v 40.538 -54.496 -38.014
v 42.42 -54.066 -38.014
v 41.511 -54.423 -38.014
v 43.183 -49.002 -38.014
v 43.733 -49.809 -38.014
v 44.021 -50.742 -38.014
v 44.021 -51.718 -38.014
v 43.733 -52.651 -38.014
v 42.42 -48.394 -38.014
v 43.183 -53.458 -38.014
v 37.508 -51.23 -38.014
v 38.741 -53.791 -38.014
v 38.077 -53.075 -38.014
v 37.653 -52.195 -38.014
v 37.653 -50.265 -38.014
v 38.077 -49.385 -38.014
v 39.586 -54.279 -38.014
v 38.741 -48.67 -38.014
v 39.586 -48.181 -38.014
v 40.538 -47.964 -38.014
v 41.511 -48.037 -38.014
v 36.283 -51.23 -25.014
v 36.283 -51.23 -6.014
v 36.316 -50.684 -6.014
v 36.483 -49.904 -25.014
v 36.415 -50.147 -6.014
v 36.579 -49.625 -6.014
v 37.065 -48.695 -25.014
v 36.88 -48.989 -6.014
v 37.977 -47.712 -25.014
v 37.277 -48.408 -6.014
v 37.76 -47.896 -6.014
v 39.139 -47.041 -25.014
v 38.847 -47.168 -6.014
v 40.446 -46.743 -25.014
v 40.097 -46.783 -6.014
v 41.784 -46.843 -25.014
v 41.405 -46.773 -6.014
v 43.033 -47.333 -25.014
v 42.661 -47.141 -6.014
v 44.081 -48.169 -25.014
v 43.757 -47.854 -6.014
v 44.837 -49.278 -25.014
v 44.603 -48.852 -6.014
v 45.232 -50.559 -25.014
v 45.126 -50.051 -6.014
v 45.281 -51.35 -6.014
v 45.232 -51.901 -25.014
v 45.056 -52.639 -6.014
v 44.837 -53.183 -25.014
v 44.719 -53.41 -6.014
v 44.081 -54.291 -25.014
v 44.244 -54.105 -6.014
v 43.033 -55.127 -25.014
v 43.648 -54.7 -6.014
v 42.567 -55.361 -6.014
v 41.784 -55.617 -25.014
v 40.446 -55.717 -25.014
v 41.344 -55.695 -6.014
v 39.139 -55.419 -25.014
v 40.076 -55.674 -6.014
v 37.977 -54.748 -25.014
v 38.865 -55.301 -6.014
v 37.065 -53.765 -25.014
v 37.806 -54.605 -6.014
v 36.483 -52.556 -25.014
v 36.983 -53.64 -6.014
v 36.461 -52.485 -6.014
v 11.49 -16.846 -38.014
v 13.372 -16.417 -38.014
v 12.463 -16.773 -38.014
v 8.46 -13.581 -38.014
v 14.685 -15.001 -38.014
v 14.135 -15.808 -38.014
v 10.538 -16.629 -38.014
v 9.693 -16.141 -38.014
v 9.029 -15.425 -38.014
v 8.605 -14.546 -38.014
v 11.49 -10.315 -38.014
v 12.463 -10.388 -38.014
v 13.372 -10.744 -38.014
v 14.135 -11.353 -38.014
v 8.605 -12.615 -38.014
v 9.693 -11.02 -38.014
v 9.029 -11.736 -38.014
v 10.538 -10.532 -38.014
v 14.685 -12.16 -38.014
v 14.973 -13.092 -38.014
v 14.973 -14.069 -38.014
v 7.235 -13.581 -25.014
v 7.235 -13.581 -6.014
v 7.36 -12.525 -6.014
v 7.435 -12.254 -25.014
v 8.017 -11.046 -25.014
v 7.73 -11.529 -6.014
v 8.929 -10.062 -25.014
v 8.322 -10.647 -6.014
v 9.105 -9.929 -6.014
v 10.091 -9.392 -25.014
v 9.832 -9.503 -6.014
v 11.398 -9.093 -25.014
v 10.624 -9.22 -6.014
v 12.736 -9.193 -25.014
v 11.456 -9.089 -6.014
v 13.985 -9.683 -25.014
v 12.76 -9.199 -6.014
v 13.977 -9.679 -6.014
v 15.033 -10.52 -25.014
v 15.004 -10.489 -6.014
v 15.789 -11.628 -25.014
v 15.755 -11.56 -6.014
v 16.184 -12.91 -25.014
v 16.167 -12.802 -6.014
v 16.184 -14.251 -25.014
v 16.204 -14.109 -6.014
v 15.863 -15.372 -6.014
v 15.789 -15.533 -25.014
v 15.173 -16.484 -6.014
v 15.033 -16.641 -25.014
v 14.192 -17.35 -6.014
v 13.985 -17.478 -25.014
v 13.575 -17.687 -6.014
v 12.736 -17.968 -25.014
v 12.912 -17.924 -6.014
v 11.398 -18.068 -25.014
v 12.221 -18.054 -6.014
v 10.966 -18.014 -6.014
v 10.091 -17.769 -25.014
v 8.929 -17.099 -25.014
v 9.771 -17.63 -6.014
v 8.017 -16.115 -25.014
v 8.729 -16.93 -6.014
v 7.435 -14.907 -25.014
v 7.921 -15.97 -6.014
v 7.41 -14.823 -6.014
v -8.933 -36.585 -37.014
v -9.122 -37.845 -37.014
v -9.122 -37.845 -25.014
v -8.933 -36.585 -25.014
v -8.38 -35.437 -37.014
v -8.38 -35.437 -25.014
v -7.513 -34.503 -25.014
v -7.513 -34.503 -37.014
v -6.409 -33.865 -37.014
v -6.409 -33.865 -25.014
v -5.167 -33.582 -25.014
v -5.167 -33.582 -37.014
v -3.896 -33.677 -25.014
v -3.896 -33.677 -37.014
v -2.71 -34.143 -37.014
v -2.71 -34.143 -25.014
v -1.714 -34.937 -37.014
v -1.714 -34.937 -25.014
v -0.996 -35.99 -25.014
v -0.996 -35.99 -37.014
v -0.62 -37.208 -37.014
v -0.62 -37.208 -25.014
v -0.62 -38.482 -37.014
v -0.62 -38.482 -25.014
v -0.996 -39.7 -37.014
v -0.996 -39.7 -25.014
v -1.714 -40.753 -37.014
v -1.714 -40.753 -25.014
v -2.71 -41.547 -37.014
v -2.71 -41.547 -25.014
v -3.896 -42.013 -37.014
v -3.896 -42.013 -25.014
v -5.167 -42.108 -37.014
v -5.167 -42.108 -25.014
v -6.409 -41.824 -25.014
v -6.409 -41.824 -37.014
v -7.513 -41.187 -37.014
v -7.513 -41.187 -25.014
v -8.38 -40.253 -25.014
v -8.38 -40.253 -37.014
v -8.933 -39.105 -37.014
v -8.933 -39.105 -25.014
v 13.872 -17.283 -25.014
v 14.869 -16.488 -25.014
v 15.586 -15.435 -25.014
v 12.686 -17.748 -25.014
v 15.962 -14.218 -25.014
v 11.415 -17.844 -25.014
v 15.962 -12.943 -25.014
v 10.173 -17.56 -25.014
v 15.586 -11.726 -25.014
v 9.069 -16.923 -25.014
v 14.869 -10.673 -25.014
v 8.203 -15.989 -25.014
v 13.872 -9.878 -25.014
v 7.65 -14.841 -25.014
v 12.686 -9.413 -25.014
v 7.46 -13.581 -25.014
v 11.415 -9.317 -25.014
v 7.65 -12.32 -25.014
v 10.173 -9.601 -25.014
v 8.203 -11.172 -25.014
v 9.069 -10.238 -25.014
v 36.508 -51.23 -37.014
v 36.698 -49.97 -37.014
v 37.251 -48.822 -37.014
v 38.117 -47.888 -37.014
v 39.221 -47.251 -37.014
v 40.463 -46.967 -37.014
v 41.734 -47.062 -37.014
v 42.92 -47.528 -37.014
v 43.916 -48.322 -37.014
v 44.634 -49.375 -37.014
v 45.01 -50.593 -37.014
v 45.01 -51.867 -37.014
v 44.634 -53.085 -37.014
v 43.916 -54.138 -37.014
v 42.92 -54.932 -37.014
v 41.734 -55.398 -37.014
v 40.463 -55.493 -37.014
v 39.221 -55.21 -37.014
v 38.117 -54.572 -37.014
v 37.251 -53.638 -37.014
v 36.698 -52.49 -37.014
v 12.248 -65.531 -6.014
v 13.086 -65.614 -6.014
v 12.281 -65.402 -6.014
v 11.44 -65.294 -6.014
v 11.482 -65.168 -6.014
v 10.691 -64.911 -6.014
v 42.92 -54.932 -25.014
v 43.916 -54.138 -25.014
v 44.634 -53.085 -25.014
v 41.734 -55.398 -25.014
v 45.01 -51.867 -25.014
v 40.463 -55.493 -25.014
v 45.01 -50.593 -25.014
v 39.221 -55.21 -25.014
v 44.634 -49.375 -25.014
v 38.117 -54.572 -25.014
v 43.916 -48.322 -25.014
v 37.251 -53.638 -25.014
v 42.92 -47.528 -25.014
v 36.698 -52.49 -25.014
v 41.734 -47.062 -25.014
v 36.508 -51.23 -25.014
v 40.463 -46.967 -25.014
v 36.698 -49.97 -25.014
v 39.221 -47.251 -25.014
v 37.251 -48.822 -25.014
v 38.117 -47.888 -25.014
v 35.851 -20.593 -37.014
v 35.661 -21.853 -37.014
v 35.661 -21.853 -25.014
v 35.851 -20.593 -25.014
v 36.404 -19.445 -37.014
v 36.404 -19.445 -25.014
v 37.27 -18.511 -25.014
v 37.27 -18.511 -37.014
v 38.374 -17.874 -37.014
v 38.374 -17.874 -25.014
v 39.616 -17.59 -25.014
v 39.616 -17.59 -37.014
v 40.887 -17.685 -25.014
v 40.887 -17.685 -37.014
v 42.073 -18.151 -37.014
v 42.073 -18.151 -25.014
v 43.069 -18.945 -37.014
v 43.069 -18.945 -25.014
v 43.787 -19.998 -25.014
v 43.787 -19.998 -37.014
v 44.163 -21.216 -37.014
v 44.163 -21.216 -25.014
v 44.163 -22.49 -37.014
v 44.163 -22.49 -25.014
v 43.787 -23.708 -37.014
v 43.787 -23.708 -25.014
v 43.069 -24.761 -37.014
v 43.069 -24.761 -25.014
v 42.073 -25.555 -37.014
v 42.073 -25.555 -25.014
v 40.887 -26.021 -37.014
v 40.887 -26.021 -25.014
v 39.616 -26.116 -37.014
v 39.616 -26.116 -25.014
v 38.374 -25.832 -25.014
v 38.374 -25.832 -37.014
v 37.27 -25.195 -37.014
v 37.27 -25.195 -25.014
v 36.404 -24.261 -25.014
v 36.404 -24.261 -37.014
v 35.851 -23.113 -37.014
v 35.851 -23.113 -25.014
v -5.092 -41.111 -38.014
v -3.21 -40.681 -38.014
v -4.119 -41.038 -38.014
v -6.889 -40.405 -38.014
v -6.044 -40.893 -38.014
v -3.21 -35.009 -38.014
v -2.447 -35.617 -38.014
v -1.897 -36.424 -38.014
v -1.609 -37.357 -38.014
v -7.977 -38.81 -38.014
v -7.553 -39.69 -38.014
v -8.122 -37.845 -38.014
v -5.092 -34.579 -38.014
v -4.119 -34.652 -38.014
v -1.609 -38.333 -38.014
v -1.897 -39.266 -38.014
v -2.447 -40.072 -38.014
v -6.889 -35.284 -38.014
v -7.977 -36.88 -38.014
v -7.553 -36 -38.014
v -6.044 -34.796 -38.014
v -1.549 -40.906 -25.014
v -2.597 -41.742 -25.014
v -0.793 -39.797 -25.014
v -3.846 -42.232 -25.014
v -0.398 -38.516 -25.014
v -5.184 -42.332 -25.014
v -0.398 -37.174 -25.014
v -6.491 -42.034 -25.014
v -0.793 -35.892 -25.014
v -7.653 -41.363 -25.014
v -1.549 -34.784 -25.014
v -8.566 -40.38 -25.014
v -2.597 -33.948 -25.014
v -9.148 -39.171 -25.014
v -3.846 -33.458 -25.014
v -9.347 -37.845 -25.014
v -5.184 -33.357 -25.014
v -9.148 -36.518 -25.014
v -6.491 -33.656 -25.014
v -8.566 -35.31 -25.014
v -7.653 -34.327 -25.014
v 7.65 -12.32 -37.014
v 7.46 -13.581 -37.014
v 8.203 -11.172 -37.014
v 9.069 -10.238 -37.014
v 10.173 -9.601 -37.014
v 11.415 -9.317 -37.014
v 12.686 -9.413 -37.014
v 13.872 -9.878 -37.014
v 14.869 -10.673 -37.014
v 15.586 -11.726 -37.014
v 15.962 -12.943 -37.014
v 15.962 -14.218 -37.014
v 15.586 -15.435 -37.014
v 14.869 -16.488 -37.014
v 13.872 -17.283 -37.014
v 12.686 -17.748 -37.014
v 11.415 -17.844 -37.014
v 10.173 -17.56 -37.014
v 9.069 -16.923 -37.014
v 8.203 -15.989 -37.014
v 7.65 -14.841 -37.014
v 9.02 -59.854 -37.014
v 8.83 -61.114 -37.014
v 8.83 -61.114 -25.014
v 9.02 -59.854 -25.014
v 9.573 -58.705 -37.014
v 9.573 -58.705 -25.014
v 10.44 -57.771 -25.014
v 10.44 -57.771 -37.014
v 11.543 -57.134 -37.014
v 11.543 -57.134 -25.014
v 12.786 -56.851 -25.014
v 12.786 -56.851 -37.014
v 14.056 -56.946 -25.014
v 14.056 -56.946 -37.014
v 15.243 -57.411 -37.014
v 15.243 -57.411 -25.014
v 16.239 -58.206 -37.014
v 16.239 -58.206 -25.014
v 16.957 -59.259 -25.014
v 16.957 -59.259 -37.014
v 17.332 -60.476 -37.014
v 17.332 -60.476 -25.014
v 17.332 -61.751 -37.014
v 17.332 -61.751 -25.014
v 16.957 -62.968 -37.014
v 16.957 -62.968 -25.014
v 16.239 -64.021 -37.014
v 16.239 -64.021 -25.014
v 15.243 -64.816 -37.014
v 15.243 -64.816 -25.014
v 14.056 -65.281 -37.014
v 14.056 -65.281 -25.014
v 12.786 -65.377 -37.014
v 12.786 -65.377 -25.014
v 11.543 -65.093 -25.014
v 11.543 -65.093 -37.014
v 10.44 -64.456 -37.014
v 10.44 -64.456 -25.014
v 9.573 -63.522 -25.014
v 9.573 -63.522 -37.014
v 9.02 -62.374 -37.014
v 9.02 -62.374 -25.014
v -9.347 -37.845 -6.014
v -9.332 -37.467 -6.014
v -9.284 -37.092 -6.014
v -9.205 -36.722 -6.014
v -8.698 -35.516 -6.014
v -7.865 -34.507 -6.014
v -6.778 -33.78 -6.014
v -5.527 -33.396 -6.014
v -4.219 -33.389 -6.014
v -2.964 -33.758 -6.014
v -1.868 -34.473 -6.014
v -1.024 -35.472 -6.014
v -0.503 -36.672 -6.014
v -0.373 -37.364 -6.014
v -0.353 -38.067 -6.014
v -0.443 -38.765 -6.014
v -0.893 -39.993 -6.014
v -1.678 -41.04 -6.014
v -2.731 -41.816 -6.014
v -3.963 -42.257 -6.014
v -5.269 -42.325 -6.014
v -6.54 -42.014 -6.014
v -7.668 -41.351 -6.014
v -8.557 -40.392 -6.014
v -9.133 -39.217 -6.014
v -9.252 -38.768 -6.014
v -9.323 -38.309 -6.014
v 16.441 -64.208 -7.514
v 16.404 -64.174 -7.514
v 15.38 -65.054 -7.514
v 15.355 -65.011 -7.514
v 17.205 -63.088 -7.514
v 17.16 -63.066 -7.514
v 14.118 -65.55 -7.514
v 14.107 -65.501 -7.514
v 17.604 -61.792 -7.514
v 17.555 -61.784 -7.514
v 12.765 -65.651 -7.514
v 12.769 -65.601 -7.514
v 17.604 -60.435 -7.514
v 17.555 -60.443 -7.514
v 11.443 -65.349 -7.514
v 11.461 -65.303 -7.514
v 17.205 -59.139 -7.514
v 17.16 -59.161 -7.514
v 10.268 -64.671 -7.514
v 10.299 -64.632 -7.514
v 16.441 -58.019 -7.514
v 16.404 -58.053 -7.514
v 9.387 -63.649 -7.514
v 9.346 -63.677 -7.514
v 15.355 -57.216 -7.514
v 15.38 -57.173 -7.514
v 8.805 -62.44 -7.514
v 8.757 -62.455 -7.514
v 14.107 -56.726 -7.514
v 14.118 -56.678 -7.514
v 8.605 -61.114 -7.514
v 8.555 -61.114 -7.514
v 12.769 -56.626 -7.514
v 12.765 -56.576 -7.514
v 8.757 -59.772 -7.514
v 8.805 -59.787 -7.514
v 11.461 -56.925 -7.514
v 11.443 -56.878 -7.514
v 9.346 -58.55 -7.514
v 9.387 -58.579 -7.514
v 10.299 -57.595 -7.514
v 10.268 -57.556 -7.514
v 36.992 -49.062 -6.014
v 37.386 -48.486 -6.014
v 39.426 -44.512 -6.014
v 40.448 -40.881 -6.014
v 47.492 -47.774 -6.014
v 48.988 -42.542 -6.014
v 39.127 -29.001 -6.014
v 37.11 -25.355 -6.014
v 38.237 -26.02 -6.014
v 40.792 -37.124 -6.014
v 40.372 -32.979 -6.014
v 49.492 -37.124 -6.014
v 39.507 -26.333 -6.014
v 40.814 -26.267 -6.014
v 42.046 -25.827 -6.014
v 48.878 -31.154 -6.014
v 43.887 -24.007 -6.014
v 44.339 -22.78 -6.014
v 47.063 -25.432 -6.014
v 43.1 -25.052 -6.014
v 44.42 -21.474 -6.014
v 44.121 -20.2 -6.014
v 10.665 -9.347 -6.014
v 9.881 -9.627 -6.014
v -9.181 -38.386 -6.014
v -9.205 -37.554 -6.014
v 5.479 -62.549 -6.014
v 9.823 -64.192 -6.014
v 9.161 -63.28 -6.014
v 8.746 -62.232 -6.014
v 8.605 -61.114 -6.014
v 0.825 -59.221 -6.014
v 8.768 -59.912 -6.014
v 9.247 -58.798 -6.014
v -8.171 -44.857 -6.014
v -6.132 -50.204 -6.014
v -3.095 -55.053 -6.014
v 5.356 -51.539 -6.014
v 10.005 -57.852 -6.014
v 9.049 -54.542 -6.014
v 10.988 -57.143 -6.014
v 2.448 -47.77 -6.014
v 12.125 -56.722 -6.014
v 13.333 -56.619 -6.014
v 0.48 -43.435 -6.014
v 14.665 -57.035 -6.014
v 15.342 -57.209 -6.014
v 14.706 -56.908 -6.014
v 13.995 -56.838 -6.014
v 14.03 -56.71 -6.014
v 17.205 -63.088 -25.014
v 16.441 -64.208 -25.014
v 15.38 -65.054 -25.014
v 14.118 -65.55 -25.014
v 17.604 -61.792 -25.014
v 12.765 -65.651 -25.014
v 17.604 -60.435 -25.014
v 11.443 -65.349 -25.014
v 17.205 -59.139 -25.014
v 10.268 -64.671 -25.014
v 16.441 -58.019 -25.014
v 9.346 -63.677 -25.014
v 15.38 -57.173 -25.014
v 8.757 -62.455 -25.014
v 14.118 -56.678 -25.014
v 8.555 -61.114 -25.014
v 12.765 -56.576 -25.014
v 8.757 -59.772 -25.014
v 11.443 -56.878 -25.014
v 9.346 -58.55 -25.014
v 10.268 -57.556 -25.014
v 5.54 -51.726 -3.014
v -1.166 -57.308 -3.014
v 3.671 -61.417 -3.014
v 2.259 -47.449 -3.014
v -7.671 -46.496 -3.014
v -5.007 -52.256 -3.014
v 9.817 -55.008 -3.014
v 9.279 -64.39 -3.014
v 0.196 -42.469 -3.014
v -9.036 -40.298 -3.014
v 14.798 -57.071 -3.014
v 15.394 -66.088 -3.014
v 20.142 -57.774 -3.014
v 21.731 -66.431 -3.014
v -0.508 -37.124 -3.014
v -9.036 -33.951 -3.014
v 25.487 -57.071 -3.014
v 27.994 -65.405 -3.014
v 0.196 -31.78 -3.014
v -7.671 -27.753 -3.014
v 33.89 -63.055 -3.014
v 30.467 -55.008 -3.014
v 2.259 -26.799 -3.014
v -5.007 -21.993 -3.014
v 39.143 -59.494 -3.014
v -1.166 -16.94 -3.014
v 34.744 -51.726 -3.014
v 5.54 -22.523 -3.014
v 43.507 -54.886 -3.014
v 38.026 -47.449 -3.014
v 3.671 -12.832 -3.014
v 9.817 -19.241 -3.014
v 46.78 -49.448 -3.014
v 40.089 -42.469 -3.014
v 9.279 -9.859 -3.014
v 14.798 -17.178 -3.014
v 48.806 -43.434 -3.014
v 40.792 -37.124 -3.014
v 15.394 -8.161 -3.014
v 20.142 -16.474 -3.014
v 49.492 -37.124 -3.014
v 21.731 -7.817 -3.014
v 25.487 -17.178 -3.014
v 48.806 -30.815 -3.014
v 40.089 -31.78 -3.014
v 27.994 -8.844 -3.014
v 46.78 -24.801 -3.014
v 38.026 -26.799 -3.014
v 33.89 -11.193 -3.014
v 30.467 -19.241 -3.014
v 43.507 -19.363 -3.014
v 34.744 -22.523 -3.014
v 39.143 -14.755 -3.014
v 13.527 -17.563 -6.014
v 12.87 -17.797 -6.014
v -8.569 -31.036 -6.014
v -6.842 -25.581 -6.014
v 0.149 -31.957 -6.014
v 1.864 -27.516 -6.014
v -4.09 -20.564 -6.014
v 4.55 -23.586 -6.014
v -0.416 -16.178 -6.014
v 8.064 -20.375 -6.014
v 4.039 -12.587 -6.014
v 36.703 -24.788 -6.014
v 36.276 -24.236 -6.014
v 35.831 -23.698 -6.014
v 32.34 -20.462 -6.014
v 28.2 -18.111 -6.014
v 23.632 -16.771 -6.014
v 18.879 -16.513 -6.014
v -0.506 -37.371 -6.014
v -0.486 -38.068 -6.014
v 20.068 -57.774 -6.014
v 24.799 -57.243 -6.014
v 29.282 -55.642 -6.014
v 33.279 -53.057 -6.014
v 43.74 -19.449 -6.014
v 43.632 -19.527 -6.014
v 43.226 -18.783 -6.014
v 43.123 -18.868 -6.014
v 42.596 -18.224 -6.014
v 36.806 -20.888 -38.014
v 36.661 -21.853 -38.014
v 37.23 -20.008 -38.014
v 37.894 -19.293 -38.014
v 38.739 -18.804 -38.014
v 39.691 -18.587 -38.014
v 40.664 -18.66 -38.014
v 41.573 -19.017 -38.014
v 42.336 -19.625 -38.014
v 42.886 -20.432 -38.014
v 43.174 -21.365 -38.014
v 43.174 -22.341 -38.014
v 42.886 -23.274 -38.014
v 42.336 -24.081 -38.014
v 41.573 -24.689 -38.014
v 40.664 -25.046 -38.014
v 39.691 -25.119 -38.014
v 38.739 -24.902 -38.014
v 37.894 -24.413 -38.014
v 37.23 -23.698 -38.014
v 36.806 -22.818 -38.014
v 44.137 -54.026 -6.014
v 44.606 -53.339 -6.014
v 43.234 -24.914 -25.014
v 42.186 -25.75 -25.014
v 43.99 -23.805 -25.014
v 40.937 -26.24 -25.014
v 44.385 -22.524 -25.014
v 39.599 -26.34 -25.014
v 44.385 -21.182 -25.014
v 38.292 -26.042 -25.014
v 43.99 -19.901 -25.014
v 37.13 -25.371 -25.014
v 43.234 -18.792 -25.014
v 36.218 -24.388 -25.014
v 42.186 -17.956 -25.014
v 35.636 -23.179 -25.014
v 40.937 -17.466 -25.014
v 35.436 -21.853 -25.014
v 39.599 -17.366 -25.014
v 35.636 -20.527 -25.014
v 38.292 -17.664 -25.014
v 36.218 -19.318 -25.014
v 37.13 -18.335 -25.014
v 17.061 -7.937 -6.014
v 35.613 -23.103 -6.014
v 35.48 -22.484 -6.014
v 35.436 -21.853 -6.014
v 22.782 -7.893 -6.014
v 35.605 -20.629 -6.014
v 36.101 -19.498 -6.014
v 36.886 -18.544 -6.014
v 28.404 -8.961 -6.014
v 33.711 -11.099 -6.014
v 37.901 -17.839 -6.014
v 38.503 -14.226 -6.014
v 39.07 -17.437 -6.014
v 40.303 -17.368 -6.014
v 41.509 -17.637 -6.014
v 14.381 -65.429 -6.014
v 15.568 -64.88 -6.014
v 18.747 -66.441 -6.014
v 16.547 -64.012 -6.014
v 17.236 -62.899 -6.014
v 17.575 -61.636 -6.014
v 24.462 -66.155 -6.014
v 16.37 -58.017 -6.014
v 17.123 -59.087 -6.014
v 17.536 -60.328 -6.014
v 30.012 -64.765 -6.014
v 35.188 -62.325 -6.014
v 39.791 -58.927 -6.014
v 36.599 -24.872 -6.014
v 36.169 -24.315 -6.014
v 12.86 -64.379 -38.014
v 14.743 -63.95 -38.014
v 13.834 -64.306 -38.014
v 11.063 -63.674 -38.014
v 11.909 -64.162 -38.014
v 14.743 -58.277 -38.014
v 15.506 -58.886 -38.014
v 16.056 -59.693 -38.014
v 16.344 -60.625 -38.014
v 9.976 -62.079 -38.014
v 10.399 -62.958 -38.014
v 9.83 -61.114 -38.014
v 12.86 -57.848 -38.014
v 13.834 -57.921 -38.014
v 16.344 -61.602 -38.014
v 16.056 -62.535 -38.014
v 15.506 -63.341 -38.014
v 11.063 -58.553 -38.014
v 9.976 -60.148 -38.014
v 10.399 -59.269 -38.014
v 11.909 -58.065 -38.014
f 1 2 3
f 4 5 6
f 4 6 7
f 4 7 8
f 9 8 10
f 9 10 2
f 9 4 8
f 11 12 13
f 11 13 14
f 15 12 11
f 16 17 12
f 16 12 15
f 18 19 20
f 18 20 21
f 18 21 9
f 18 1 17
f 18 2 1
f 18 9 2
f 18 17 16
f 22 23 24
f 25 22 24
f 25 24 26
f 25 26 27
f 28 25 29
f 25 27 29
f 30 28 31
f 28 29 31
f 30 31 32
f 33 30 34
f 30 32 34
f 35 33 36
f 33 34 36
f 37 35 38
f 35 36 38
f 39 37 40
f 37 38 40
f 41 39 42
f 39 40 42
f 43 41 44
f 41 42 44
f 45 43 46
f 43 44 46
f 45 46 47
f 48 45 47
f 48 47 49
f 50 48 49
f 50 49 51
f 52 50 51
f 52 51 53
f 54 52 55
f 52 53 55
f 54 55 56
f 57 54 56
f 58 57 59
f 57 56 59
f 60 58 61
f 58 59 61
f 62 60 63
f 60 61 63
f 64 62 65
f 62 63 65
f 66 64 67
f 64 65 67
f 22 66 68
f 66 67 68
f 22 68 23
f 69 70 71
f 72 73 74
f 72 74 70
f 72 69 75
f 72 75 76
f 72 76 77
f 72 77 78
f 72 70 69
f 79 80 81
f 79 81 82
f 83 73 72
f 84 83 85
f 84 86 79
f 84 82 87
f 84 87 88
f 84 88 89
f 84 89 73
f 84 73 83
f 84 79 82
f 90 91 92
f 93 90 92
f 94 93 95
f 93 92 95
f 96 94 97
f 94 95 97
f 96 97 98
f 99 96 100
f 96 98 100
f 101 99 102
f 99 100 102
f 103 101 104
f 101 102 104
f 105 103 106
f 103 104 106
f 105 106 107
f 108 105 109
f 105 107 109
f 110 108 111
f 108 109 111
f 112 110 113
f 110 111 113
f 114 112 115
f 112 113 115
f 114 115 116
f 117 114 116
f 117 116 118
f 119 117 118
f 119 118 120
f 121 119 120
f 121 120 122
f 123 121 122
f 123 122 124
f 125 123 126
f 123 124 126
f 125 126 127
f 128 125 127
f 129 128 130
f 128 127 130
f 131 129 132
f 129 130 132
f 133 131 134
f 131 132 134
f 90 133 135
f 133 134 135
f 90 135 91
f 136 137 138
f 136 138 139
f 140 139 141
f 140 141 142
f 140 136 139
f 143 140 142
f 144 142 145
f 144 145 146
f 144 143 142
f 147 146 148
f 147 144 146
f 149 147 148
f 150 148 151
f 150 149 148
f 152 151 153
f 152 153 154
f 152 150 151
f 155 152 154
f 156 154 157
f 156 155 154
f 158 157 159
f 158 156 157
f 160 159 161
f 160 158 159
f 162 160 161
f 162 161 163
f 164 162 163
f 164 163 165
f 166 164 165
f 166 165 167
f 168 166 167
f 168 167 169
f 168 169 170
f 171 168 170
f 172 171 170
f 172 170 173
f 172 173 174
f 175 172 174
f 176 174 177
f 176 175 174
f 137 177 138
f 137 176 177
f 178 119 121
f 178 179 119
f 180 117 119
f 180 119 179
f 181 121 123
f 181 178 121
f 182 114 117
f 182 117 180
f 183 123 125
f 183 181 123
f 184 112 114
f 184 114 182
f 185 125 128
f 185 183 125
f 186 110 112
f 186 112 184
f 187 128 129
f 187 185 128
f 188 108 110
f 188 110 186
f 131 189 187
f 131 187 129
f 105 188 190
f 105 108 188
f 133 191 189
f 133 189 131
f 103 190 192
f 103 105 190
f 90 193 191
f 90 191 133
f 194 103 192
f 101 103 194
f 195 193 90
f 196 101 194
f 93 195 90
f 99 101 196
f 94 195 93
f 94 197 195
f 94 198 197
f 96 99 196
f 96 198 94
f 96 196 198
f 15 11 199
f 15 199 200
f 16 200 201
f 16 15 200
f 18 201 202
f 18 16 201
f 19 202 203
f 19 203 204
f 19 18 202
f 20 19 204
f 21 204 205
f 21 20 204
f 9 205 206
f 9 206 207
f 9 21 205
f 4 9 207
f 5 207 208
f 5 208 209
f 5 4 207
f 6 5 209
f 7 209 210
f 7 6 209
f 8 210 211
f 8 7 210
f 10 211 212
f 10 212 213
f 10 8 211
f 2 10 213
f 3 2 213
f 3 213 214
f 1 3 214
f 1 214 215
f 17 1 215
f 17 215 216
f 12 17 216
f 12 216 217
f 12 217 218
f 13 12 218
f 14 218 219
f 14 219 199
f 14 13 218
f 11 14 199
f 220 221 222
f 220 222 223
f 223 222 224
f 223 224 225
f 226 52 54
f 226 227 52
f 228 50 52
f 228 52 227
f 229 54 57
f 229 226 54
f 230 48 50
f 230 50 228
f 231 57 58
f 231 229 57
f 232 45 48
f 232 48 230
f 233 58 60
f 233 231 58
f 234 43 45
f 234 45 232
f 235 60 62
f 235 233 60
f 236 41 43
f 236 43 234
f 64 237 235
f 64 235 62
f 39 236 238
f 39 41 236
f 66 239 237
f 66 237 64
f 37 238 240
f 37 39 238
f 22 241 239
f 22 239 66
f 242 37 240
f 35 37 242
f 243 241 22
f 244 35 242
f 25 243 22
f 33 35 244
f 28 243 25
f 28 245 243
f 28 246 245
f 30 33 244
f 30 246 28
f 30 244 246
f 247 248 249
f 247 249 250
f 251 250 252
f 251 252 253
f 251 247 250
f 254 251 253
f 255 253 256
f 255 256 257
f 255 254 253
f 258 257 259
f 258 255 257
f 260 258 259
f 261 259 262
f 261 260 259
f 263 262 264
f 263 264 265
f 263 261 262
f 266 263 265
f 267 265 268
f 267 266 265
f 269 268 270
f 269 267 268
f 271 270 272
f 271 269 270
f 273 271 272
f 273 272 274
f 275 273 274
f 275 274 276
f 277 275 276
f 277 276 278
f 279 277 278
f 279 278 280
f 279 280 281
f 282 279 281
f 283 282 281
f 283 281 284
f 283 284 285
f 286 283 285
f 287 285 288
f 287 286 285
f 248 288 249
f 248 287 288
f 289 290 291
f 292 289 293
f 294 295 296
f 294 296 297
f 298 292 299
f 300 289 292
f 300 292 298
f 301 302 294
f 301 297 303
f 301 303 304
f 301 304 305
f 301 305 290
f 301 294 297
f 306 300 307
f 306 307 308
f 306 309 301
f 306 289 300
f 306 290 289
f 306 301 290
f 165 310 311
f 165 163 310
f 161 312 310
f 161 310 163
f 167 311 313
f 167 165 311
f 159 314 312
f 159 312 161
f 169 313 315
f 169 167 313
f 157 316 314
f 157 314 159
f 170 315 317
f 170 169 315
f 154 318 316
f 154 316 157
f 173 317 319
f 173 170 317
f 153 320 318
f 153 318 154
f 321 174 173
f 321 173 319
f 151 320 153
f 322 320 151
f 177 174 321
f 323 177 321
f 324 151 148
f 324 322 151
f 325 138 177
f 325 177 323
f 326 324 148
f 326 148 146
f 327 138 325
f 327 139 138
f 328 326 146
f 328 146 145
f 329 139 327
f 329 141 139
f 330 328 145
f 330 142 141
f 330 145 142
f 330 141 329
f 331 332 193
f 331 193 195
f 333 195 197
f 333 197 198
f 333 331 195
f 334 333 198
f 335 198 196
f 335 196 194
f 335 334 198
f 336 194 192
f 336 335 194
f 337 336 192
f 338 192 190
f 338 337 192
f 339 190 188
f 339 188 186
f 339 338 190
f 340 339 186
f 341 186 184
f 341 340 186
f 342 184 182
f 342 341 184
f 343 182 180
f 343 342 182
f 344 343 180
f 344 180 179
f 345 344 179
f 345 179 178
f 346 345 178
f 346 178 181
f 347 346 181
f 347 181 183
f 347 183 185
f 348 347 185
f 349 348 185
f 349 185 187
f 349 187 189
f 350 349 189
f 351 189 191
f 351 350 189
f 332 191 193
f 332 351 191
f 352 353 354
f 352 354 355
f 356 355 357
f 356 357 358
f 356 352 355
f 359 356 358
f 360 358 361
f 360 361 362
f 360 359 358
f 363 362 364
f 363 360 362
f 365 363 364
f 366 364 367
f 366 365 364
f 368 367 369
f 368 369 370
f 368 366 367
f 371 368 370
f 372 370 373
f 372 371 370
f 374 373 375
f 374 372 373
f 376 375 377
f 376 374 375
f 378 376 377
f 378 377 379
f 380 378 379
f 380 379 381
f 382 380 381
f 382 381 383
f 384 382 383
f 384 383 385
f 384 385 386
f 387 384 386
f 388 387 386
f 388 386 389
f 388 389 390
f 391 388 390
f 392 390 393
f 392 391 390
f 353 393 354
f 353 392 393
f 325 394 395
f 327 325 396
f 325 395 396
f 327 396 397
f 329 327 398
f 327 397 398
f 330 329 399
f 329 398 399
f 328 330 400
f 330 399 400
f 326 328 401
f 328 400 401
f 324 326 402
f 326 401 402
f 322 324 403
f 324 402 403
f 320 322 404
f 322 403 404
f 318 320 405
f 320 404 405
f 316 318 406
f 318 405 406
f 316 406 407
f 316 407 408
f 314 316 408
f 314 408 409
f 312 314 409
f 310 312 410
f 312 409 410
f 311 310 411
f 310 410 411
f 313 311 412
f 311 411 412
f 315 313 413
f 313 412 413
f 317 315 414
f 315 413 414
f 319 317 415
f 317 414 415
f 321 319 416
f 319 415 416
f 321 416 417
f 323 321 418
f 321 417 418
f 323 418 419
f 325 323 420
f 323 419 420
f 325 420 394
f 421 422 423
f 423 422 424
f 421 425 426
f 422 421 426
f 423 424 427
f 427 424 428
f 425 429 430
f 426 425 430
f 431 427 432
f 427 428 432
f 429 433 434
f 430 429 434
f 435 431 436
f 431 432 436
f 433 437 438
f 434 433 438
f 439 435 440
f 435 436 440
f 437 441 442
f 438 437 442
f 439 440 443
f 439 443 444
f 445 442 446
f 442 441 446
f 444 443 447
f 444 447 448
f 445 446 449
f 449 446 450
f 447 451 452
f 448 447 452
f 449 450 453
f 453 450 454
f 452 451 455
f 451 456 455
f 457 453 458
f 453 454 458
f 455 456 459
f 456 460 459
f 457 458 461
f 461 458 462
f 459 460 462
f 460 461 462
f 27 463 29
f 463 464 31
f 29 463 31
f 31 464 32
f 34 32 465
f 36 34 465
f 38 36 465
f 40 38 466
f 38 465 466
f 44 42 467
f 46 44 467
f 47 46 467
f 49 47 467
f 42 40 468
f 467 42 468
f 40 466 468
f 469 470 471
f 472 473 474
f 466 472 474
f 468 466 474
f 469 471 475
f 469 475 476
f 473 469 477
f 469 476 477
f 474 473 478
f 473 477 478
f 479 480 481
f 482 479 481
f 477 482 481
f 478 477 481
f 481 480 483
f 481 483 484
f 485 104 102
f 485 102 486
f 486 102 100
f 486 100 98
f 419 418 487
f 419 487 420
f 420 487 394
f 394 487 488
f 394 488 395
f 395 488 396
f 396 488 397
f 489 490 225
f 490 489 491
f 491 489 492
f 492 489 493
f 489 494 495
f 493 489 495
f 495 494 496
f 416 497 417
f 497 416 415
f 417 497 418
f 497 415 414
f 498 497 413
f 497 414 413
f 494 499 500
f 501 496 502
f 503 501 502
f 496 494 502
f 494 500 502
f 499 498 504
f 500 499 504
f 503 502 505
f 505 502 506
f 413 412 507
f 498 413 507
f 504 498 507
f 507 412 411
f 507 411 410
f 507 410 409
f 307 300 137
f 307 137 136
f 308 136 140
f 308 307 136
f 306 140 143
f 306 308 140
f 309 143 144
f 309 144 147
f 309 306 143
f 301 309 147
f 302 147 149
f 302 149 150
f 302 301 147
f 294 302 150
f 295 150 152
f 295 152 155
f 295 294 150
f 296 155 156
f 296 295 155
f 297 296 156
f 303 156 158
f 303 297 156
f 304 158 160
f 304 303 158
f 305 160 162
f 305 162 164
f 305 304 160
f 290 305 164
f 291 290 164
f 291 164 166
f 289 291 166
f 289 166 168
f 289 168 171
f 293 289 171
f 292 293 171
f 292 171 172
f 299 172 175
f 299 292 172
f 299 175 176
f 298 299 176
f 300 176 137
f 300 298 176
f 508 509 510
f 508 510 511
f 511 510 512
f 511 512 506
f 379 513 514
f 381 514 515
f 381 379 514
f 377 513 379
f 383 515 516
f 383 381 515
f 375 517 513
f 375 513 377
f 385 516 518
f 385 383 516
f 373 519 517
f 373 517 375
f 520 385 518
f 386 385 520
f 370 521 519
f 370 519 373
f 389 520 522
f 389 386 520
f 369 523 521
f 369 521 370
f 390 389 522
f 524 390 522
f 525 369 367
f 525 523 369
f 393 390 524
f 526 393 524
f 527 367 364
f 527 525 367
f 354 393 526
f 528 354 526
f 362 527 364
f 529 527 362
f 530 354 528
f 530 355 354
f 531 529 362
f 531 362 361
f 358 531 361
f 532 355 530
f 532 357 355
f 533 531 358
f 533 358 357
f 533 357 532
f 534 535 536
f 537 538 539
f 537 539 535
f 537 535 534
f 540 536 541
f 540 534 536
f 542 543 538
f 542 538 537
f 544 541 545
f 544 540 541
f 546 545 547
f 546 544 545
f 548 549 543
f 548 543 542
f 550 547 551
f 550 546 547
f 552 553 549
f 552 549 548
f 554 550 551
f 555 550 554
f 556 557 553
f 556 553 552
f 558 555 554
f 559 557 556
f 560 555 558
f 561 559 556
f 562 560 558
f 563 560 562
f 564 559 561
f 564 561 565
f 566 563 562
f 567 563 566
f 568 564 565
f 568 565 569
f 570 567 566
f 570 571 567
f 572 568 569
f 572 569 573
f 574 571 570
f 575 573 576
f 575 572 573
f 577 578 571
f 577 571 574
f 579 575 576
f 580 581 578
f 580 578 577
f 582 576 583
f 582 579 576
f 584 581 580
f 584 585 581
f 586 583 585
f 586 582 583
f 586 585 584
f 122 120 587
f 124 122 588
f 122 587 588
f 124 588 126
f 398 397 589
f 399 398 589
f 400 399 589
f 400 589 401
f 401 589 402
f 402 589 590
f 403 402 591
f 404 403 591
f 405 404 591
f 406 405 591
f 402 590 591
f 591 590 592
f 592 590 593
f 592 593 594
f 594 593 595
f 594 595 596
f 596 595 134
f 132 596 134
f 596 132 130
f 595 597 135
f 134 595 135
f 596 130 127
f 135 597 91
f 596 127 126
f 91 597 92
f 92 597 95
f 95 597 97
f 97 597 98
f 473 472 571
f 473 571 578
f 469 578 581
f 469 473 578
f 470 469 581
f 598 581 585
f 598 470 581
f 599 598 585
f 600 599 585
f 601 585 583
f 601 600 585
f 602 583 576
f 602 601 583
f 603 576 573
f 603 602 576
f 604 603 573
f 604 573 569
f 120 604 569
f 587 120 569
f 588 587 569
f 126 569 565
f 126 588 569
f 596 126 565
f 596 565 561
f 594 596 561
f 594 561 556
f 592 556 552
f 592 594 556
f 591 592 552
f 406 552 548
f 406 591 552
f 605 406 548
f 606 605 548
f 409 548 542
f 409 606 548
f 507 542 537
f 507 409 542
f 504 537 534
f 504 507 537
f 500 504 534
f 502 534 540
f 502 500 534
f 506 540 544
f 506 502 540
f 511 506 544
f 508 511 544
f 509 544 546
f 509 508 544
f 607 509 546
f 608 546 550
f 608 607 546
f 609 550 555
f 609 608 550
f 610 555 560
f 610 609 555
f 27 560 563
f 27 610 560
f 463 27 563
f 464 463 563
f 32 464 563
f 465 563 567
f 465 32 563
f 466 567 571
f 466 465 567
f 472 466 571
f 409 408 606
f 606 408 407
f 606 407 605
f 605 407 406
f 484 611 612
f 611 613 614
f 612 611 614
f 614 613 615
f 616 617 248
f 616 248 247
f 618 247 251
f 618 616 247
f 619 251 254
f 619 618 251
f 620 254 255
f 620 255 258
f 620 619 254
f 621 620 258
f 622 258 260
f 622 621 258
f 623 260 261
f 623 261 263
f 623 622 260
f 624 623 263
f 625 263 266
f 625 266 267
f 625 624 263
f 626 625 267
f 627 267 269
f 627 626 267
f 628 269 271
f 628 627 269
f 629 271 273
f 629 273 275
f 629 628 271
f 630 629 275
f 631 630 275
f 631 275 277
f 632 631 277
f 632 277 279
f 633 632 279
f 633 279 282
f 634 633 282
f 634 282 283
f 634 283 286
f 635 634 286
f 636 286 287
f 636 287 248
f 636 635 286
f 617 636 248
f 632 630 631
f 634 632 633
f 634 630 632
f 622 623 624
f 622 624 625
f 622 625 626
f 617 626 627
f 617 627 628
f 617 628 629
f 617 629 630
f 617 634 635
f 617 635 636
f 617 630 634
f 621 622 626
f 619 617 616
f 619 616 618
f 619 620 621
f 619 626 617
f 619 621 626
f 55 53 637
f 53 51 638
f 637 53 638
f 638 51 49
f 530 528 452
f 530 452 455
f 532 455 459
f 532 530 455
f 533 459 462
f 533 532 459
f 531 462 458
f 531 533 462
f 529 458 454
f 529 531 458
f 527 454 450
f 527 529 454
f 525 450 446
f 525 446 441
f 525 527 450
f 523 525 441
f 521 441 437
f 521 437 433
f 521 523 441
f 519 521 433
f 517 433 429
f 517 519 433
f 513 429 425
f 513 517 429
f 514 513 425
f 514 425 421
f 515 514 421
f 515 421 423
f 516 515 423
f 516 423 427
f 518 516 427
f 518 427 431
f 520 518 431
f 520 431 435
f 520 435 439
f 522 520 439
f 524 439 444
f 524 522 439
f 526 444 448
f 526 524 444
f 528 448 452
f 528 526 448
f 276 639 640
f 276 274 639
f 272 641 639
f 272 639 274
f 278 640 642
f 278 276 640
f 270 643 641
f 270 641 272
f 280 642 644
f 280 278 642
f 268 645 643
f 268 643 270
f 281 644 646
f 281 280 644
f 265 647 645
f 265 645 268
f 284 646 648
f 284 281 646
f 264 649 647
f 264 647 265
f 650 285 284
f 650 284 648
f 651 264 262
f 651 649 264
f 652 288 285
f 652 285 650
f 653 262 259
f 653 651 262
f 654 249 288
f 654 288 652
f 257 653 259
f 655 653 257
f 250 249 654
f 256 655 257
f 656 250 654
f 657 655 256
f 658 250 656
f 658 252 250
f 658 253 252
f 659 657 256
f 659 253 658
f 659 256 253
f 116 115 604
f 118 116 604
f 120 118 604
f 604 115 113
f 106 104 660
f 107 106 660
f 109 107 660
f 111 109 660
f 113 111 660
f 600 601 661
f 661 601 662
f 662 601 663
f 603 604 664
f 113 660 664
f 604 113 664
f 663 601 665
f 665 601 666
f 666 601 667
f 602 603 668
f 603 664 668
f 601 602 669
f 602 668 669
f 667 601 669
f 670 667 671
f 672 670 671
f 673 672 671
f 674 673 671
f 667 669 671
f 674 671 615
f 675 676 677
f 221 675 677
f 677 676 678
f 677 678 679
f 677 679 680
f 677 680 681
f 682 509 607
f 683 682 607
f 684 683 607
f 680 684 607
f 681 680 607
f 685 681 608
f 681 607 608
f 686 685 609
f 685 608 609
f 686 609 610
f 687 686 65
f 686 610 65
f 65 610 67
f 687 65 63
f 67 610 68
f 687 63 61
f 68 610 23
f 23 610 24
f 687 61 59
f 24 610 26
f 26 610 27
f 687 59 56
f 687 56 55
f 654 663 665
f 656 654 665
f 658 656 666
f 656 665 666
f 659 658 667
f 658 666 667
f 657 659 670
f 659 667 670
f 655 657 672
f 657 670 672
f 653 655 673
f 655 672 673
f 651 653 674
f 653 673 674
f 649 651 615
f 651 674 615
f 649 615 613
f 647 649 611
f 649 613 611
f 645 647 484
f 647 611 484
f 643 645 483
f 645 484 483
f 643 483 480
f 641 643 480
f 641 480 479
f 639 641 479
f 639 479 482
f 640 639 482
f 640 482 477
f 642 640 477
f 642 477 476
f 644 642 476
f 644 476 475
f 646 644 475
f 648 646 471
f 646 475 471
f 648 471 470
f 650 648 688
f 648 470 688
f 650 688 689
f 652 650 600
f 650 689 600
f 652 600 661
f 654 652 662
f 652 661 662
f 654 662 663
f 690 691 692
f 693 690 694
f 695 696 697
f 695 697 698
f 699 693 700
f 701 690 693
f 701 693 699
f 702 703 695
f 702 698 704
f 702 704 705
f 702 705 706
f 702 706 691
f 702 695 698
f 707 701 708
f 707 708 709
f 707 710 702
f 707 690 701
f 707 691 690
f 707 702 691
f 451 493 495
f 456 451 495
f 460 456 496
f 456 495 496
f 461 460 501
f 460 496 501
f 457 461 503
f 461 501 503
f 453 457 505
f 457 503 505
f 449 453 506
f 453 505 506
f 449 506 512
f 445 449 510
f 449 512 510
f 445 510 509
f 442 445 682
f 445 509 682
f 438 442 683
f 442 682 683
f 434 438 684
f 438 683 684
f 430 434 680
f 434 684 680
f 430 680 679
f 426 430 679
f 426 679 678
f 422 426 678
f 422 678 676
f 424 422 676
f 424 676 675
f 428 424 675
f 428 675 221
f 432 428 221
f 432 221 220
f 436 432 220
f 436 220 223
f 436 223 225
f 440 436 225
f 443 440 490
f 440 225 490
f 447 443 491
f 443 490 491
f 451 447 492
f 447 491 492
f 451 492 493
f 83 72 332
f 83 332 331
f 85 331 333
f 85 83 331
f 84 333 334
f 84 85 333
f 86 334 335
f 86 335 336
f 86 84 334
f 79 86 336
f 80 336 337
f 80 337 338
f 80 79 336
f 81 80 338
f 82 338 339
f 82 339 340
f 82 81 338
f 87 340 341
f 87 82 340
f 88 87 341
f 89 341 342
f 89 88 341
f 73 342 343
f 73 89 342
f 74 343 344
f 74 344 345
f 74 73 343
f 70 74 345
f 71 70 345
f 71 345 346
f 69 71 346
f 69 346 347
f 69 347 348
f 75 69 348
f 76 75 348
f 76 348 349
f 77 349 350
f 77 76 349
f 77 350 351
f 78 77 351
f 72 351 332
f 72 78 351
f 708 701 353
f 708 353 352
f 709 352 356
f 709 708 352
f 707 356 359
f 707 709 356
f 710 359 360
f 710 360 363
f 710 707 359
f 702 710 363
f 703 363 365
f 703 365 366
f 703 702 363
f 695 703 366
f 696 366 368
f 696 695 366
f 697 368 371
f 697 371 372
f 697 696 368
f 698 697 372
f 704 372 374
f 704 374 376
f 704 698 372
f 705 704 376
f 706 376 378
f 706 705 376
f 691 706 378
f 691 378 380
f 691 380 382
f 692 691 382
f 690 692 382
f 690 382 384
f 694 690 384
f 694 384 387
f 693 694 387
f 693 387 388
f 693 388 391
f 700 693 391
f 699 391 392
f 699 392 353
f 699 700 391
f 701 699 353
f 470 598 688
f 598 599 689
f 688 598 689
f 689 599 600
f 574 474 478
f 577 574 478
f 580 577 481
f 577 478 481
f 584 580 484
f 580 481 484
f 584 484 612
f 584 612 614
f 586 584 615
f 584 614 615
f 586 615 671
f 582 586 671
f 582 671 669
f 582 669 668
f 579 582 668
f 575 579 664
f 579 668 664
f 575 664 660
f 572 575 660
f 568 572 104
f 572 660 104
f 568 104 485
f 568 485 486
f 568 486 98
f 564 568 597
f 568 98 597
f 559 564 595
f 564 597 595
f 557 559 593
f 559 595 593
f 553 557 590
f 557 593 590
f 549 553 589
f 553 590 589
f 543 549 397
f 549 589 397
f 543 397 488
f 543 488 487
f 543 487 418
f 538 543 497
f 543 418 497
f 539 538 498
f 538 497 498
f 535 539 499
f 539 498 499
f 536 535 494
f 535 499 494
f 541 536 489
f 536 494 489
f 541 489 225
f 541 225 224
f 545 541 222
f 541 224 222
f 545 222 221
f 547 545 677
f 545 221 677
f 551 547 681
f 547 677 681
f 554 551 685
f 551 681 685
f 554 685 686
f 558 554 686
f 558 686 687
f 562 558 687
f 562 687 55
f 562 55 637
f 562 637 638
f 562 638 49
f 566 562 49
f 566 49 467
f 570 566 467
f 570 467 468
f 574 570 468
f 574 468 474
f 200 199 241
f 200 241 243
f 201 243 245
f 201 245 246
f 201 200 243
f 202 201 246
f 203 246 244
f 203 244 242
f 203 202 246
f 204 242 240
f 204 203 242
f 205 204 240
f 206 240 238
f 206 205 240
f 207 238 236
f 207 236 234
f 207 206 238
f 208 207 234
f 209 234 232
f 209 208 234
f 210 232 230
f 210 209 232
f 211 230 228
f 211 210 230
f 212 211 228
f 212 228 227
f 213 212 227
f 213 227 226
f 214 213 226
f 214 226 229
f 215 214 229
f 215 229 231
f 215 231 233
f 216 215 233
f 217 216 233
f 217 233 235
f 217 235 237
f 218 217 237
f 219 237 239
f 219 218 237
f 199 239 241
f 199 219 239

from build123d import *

# Parameters (mm, degrees)
SKETCH2_R             = 4.5
BOSS_EXTRUDE1_DEPTH   = 30
BOSS_EXTRUDE1_2_DEPTH = 30
BOSS_EXTRUDE1_3_DEPTH = 30
BOSS_EXTRUDE1_4_DEPTH = 30
BOSS_EXTRUDE1_5_DEPTH = 30
SKETCH3_R             = 29.35
SKETCH3_R_2           = 20.65
BOSS_EXTRUDE2_DEPTH   = 3
SKETCH4_R             = 4.5
BOSS_EXTRUDE3_DEPTH   = 2
SKETCH5_R             = 4.5
SKETCH5_R_2           = 4.275
CUT_EXTRUDE1_DEPTH    = 13
CHAMFER1_SIZE         = 1
SKETCH6_R             = 4.55
BOSS_EXTRUDE4_DEPTH   = 17.5


with BuildPart() as part:
    # Sketch2 → Boss-Extrude1 (new body)
    with BuildSketch(Plane(origin=(0, 0, -6.013631981), x_dir=(-1, 0, 0), z_dir=(0, 0, -1))):
        with Locations((-11.73472812, -13.580511576)):
            Circle(SKETCH2_R)
    extrude(amount=BOSS_EXTRUDE1_DEPTH)



with BuildPart() as body_2:
    # Sketch2 → Boss-Extrude1 2 (new body)
    with BuildSketch(Plane(origin=(0, 0, -6.013631981), x_dir=(-1, 0, 0), z_dir=(0, 0, -1))):
        with Locations((4.847454424, -37.844888326)):
            Circle(SKETCH2_R)
    extrude(amount=BOSS_EXTRUDE1_2_DEPTH)


with BuildPart() as body_3:
    # Sketch2 → Boss-Extrude1 3 (new body)
    with BuildSketch(Plane(origin=(0, 0, -6.013631981), x_dir=(-1, 0, 0), z_dir=(0, 0, -1))):
        with Locations((-13.105162988, -61.113585864)):
            Circle(SKETCH2_R)
    extrude(amount=BOSS_EXTRUDE1_3_DEPTH)


with BuildPart() as body_4:
    # Sketch2 → Boss-Extrude1 4 (new body)
    with BuildSketch(Plane(origin=(0, 0, -6.013631981), x_dir=(-1, 0, 0), z_dir=(0, 0, -1))):
        with Locations((-40.78267328, -51.230055065)):
            Circle(SKETCH2_R)
    extrude(amount=BOSS_EXTRUDE1_4_DEPTH)


with BuildPart() as body_5:
    # Sketch2 → Boss-Extrude1 5 (new body)
    with BuildSketch(Plane(origin=(0, 0, -6.013631981), x_dir=(-1, 0, 0), z_dir=(0, 0, -1))):
        with Locations((-39.935697953, -21.852999565)):
            Circle(SKETCH2_R)
    extrude(amount=BOSS_EXTRUDE1_5_DEPTH)


with BuildPart() as part_1:
    add(part.part)

    add(body_2.part)  # Boss-Extrude2 merges body 2

    add(body_3.part)  # Boss-Extrude2 merges body 3

    add(body_4.part)  # Boss-Extrude2 merges body 4

    add(body_5.part)  # Boss-Extrude2 merges body 5
    # Sketch3 → Boss-Extrude2 (add)
    with BuildSketch(Plane.XY.offset(-6.013631981)):
        with Locations((20.142161583, -37.124408079)):
            Circle(SKETCH3_R)
        with Locations((20.142161583, -37.124408079)):
            Circle(SKETCH3_R_2, mode=Mode.SUBTRACT)
    extrude(amount=BOSS_EXTRUDE2_DEPTH)

    # Sketch4 → Boss-Extrude3 (add)
    with BuildSketch(Plane(origin=(0, 0, -36.013631981), x_dir=(-1, 0, 0), z_dir=(0, 0, -1))):
        with Locations((4.847454424, -37.844888326)):
            Circle(SKETCH4_R)
        with Locations((-11.73472812, -13.580511576)):
            Circle(SKETCH4_R)
        with Locations((-39.935697953, -21.852999565)):
            Circle(SKETCH4_R)
        with Locations((-40.78267328, -51.230055065)):
            Circle(SKETCH4_R)
        with Locations((-13.105162988, -61.113585864)):
            Circle(SKETCH4_R)
    extrude(amount=BOSS_EXTRUDE3_DEPTH)

    # Sketch5 → Cut-Extrude1 (cut)
    with BuildSketch(Plane(origin=(0, 0, -38.013631981), x_dir=(-1, 0, 0), z_dir=(0, 0, -1))):
        with Locations((-13.105162988, -61.113585864)):
            Circle(SKETCH5_R)
        with Locations((-13.105162988, -61.113585864)):
            Circle(SKETCH5_R_2, mode=Mode.SUBTRACT)
        with Locations((-40.78267328, -51.230055065)):
            Circle(SKETCH5_R)
        with Locations((-40.78267328, -51.230055065)):
            Circle(SKETCH5_R_2, mode=Mode.SUBTRACT)
        with Locations((-39.935697953, -21.852999565)):
            Circle(SKETCH5_R)
        with Locations((-39.935697953, -21.852999565)):
            Circle(SKETCH5_R_2, mode=Mode.SUBTRACT)
        with Locations((-11.73472812, -13.580511576)):
            Circle(SKETCH5_R)
        with Locations((-11.73472812, -13.580511576)):
            Circle(SKETCH5_R_2, mode=Mode.SUBTRACT)
        with Locations((4.847454424, -37.844888326)):
            Circle(SKETCH5_R)
        with Locations((4.847454424, -37.844888326)):
            Circle(SKETCH5_R_2, mode=Mode.SUBTRACT)
    extrude(amount=-CUT_EXTRUDE1_DEPTH, mode=Mode.SUBTRACT)

    # Chamfer1
    chamfer1_edges = [part_1.edges().sort_by_distance(p)[0] for p in [
        (17.380162988, -61.113585864, -38.013631981),
        (45.05767328, -51.230055065, -38.013631981),
        (44.210697953, -21.852999565, -38.013631981),
        (16.00972812, -13.580511576, -38.013631981),
        (-0.572454424, -37.844888326, -38.013631981),
    ]]
    chamfer(chamfer1_edges, length=CHAMFER1_SIZE)

    # Sketch6 → Boss-Extrude4 (add)
    with BuildSketch(Plane(origin=(0, 0, -25.013631981), x_dir=(-1, 0, 0), z_dir=(0, 0, -1))):
        with Locations((-13.105162988, -61.113585864)):
            Circle(SKETCH6_R)
    extrude(amount=-BOSS_EXTRUDE4_DEPTH)


solid = part_1.part
